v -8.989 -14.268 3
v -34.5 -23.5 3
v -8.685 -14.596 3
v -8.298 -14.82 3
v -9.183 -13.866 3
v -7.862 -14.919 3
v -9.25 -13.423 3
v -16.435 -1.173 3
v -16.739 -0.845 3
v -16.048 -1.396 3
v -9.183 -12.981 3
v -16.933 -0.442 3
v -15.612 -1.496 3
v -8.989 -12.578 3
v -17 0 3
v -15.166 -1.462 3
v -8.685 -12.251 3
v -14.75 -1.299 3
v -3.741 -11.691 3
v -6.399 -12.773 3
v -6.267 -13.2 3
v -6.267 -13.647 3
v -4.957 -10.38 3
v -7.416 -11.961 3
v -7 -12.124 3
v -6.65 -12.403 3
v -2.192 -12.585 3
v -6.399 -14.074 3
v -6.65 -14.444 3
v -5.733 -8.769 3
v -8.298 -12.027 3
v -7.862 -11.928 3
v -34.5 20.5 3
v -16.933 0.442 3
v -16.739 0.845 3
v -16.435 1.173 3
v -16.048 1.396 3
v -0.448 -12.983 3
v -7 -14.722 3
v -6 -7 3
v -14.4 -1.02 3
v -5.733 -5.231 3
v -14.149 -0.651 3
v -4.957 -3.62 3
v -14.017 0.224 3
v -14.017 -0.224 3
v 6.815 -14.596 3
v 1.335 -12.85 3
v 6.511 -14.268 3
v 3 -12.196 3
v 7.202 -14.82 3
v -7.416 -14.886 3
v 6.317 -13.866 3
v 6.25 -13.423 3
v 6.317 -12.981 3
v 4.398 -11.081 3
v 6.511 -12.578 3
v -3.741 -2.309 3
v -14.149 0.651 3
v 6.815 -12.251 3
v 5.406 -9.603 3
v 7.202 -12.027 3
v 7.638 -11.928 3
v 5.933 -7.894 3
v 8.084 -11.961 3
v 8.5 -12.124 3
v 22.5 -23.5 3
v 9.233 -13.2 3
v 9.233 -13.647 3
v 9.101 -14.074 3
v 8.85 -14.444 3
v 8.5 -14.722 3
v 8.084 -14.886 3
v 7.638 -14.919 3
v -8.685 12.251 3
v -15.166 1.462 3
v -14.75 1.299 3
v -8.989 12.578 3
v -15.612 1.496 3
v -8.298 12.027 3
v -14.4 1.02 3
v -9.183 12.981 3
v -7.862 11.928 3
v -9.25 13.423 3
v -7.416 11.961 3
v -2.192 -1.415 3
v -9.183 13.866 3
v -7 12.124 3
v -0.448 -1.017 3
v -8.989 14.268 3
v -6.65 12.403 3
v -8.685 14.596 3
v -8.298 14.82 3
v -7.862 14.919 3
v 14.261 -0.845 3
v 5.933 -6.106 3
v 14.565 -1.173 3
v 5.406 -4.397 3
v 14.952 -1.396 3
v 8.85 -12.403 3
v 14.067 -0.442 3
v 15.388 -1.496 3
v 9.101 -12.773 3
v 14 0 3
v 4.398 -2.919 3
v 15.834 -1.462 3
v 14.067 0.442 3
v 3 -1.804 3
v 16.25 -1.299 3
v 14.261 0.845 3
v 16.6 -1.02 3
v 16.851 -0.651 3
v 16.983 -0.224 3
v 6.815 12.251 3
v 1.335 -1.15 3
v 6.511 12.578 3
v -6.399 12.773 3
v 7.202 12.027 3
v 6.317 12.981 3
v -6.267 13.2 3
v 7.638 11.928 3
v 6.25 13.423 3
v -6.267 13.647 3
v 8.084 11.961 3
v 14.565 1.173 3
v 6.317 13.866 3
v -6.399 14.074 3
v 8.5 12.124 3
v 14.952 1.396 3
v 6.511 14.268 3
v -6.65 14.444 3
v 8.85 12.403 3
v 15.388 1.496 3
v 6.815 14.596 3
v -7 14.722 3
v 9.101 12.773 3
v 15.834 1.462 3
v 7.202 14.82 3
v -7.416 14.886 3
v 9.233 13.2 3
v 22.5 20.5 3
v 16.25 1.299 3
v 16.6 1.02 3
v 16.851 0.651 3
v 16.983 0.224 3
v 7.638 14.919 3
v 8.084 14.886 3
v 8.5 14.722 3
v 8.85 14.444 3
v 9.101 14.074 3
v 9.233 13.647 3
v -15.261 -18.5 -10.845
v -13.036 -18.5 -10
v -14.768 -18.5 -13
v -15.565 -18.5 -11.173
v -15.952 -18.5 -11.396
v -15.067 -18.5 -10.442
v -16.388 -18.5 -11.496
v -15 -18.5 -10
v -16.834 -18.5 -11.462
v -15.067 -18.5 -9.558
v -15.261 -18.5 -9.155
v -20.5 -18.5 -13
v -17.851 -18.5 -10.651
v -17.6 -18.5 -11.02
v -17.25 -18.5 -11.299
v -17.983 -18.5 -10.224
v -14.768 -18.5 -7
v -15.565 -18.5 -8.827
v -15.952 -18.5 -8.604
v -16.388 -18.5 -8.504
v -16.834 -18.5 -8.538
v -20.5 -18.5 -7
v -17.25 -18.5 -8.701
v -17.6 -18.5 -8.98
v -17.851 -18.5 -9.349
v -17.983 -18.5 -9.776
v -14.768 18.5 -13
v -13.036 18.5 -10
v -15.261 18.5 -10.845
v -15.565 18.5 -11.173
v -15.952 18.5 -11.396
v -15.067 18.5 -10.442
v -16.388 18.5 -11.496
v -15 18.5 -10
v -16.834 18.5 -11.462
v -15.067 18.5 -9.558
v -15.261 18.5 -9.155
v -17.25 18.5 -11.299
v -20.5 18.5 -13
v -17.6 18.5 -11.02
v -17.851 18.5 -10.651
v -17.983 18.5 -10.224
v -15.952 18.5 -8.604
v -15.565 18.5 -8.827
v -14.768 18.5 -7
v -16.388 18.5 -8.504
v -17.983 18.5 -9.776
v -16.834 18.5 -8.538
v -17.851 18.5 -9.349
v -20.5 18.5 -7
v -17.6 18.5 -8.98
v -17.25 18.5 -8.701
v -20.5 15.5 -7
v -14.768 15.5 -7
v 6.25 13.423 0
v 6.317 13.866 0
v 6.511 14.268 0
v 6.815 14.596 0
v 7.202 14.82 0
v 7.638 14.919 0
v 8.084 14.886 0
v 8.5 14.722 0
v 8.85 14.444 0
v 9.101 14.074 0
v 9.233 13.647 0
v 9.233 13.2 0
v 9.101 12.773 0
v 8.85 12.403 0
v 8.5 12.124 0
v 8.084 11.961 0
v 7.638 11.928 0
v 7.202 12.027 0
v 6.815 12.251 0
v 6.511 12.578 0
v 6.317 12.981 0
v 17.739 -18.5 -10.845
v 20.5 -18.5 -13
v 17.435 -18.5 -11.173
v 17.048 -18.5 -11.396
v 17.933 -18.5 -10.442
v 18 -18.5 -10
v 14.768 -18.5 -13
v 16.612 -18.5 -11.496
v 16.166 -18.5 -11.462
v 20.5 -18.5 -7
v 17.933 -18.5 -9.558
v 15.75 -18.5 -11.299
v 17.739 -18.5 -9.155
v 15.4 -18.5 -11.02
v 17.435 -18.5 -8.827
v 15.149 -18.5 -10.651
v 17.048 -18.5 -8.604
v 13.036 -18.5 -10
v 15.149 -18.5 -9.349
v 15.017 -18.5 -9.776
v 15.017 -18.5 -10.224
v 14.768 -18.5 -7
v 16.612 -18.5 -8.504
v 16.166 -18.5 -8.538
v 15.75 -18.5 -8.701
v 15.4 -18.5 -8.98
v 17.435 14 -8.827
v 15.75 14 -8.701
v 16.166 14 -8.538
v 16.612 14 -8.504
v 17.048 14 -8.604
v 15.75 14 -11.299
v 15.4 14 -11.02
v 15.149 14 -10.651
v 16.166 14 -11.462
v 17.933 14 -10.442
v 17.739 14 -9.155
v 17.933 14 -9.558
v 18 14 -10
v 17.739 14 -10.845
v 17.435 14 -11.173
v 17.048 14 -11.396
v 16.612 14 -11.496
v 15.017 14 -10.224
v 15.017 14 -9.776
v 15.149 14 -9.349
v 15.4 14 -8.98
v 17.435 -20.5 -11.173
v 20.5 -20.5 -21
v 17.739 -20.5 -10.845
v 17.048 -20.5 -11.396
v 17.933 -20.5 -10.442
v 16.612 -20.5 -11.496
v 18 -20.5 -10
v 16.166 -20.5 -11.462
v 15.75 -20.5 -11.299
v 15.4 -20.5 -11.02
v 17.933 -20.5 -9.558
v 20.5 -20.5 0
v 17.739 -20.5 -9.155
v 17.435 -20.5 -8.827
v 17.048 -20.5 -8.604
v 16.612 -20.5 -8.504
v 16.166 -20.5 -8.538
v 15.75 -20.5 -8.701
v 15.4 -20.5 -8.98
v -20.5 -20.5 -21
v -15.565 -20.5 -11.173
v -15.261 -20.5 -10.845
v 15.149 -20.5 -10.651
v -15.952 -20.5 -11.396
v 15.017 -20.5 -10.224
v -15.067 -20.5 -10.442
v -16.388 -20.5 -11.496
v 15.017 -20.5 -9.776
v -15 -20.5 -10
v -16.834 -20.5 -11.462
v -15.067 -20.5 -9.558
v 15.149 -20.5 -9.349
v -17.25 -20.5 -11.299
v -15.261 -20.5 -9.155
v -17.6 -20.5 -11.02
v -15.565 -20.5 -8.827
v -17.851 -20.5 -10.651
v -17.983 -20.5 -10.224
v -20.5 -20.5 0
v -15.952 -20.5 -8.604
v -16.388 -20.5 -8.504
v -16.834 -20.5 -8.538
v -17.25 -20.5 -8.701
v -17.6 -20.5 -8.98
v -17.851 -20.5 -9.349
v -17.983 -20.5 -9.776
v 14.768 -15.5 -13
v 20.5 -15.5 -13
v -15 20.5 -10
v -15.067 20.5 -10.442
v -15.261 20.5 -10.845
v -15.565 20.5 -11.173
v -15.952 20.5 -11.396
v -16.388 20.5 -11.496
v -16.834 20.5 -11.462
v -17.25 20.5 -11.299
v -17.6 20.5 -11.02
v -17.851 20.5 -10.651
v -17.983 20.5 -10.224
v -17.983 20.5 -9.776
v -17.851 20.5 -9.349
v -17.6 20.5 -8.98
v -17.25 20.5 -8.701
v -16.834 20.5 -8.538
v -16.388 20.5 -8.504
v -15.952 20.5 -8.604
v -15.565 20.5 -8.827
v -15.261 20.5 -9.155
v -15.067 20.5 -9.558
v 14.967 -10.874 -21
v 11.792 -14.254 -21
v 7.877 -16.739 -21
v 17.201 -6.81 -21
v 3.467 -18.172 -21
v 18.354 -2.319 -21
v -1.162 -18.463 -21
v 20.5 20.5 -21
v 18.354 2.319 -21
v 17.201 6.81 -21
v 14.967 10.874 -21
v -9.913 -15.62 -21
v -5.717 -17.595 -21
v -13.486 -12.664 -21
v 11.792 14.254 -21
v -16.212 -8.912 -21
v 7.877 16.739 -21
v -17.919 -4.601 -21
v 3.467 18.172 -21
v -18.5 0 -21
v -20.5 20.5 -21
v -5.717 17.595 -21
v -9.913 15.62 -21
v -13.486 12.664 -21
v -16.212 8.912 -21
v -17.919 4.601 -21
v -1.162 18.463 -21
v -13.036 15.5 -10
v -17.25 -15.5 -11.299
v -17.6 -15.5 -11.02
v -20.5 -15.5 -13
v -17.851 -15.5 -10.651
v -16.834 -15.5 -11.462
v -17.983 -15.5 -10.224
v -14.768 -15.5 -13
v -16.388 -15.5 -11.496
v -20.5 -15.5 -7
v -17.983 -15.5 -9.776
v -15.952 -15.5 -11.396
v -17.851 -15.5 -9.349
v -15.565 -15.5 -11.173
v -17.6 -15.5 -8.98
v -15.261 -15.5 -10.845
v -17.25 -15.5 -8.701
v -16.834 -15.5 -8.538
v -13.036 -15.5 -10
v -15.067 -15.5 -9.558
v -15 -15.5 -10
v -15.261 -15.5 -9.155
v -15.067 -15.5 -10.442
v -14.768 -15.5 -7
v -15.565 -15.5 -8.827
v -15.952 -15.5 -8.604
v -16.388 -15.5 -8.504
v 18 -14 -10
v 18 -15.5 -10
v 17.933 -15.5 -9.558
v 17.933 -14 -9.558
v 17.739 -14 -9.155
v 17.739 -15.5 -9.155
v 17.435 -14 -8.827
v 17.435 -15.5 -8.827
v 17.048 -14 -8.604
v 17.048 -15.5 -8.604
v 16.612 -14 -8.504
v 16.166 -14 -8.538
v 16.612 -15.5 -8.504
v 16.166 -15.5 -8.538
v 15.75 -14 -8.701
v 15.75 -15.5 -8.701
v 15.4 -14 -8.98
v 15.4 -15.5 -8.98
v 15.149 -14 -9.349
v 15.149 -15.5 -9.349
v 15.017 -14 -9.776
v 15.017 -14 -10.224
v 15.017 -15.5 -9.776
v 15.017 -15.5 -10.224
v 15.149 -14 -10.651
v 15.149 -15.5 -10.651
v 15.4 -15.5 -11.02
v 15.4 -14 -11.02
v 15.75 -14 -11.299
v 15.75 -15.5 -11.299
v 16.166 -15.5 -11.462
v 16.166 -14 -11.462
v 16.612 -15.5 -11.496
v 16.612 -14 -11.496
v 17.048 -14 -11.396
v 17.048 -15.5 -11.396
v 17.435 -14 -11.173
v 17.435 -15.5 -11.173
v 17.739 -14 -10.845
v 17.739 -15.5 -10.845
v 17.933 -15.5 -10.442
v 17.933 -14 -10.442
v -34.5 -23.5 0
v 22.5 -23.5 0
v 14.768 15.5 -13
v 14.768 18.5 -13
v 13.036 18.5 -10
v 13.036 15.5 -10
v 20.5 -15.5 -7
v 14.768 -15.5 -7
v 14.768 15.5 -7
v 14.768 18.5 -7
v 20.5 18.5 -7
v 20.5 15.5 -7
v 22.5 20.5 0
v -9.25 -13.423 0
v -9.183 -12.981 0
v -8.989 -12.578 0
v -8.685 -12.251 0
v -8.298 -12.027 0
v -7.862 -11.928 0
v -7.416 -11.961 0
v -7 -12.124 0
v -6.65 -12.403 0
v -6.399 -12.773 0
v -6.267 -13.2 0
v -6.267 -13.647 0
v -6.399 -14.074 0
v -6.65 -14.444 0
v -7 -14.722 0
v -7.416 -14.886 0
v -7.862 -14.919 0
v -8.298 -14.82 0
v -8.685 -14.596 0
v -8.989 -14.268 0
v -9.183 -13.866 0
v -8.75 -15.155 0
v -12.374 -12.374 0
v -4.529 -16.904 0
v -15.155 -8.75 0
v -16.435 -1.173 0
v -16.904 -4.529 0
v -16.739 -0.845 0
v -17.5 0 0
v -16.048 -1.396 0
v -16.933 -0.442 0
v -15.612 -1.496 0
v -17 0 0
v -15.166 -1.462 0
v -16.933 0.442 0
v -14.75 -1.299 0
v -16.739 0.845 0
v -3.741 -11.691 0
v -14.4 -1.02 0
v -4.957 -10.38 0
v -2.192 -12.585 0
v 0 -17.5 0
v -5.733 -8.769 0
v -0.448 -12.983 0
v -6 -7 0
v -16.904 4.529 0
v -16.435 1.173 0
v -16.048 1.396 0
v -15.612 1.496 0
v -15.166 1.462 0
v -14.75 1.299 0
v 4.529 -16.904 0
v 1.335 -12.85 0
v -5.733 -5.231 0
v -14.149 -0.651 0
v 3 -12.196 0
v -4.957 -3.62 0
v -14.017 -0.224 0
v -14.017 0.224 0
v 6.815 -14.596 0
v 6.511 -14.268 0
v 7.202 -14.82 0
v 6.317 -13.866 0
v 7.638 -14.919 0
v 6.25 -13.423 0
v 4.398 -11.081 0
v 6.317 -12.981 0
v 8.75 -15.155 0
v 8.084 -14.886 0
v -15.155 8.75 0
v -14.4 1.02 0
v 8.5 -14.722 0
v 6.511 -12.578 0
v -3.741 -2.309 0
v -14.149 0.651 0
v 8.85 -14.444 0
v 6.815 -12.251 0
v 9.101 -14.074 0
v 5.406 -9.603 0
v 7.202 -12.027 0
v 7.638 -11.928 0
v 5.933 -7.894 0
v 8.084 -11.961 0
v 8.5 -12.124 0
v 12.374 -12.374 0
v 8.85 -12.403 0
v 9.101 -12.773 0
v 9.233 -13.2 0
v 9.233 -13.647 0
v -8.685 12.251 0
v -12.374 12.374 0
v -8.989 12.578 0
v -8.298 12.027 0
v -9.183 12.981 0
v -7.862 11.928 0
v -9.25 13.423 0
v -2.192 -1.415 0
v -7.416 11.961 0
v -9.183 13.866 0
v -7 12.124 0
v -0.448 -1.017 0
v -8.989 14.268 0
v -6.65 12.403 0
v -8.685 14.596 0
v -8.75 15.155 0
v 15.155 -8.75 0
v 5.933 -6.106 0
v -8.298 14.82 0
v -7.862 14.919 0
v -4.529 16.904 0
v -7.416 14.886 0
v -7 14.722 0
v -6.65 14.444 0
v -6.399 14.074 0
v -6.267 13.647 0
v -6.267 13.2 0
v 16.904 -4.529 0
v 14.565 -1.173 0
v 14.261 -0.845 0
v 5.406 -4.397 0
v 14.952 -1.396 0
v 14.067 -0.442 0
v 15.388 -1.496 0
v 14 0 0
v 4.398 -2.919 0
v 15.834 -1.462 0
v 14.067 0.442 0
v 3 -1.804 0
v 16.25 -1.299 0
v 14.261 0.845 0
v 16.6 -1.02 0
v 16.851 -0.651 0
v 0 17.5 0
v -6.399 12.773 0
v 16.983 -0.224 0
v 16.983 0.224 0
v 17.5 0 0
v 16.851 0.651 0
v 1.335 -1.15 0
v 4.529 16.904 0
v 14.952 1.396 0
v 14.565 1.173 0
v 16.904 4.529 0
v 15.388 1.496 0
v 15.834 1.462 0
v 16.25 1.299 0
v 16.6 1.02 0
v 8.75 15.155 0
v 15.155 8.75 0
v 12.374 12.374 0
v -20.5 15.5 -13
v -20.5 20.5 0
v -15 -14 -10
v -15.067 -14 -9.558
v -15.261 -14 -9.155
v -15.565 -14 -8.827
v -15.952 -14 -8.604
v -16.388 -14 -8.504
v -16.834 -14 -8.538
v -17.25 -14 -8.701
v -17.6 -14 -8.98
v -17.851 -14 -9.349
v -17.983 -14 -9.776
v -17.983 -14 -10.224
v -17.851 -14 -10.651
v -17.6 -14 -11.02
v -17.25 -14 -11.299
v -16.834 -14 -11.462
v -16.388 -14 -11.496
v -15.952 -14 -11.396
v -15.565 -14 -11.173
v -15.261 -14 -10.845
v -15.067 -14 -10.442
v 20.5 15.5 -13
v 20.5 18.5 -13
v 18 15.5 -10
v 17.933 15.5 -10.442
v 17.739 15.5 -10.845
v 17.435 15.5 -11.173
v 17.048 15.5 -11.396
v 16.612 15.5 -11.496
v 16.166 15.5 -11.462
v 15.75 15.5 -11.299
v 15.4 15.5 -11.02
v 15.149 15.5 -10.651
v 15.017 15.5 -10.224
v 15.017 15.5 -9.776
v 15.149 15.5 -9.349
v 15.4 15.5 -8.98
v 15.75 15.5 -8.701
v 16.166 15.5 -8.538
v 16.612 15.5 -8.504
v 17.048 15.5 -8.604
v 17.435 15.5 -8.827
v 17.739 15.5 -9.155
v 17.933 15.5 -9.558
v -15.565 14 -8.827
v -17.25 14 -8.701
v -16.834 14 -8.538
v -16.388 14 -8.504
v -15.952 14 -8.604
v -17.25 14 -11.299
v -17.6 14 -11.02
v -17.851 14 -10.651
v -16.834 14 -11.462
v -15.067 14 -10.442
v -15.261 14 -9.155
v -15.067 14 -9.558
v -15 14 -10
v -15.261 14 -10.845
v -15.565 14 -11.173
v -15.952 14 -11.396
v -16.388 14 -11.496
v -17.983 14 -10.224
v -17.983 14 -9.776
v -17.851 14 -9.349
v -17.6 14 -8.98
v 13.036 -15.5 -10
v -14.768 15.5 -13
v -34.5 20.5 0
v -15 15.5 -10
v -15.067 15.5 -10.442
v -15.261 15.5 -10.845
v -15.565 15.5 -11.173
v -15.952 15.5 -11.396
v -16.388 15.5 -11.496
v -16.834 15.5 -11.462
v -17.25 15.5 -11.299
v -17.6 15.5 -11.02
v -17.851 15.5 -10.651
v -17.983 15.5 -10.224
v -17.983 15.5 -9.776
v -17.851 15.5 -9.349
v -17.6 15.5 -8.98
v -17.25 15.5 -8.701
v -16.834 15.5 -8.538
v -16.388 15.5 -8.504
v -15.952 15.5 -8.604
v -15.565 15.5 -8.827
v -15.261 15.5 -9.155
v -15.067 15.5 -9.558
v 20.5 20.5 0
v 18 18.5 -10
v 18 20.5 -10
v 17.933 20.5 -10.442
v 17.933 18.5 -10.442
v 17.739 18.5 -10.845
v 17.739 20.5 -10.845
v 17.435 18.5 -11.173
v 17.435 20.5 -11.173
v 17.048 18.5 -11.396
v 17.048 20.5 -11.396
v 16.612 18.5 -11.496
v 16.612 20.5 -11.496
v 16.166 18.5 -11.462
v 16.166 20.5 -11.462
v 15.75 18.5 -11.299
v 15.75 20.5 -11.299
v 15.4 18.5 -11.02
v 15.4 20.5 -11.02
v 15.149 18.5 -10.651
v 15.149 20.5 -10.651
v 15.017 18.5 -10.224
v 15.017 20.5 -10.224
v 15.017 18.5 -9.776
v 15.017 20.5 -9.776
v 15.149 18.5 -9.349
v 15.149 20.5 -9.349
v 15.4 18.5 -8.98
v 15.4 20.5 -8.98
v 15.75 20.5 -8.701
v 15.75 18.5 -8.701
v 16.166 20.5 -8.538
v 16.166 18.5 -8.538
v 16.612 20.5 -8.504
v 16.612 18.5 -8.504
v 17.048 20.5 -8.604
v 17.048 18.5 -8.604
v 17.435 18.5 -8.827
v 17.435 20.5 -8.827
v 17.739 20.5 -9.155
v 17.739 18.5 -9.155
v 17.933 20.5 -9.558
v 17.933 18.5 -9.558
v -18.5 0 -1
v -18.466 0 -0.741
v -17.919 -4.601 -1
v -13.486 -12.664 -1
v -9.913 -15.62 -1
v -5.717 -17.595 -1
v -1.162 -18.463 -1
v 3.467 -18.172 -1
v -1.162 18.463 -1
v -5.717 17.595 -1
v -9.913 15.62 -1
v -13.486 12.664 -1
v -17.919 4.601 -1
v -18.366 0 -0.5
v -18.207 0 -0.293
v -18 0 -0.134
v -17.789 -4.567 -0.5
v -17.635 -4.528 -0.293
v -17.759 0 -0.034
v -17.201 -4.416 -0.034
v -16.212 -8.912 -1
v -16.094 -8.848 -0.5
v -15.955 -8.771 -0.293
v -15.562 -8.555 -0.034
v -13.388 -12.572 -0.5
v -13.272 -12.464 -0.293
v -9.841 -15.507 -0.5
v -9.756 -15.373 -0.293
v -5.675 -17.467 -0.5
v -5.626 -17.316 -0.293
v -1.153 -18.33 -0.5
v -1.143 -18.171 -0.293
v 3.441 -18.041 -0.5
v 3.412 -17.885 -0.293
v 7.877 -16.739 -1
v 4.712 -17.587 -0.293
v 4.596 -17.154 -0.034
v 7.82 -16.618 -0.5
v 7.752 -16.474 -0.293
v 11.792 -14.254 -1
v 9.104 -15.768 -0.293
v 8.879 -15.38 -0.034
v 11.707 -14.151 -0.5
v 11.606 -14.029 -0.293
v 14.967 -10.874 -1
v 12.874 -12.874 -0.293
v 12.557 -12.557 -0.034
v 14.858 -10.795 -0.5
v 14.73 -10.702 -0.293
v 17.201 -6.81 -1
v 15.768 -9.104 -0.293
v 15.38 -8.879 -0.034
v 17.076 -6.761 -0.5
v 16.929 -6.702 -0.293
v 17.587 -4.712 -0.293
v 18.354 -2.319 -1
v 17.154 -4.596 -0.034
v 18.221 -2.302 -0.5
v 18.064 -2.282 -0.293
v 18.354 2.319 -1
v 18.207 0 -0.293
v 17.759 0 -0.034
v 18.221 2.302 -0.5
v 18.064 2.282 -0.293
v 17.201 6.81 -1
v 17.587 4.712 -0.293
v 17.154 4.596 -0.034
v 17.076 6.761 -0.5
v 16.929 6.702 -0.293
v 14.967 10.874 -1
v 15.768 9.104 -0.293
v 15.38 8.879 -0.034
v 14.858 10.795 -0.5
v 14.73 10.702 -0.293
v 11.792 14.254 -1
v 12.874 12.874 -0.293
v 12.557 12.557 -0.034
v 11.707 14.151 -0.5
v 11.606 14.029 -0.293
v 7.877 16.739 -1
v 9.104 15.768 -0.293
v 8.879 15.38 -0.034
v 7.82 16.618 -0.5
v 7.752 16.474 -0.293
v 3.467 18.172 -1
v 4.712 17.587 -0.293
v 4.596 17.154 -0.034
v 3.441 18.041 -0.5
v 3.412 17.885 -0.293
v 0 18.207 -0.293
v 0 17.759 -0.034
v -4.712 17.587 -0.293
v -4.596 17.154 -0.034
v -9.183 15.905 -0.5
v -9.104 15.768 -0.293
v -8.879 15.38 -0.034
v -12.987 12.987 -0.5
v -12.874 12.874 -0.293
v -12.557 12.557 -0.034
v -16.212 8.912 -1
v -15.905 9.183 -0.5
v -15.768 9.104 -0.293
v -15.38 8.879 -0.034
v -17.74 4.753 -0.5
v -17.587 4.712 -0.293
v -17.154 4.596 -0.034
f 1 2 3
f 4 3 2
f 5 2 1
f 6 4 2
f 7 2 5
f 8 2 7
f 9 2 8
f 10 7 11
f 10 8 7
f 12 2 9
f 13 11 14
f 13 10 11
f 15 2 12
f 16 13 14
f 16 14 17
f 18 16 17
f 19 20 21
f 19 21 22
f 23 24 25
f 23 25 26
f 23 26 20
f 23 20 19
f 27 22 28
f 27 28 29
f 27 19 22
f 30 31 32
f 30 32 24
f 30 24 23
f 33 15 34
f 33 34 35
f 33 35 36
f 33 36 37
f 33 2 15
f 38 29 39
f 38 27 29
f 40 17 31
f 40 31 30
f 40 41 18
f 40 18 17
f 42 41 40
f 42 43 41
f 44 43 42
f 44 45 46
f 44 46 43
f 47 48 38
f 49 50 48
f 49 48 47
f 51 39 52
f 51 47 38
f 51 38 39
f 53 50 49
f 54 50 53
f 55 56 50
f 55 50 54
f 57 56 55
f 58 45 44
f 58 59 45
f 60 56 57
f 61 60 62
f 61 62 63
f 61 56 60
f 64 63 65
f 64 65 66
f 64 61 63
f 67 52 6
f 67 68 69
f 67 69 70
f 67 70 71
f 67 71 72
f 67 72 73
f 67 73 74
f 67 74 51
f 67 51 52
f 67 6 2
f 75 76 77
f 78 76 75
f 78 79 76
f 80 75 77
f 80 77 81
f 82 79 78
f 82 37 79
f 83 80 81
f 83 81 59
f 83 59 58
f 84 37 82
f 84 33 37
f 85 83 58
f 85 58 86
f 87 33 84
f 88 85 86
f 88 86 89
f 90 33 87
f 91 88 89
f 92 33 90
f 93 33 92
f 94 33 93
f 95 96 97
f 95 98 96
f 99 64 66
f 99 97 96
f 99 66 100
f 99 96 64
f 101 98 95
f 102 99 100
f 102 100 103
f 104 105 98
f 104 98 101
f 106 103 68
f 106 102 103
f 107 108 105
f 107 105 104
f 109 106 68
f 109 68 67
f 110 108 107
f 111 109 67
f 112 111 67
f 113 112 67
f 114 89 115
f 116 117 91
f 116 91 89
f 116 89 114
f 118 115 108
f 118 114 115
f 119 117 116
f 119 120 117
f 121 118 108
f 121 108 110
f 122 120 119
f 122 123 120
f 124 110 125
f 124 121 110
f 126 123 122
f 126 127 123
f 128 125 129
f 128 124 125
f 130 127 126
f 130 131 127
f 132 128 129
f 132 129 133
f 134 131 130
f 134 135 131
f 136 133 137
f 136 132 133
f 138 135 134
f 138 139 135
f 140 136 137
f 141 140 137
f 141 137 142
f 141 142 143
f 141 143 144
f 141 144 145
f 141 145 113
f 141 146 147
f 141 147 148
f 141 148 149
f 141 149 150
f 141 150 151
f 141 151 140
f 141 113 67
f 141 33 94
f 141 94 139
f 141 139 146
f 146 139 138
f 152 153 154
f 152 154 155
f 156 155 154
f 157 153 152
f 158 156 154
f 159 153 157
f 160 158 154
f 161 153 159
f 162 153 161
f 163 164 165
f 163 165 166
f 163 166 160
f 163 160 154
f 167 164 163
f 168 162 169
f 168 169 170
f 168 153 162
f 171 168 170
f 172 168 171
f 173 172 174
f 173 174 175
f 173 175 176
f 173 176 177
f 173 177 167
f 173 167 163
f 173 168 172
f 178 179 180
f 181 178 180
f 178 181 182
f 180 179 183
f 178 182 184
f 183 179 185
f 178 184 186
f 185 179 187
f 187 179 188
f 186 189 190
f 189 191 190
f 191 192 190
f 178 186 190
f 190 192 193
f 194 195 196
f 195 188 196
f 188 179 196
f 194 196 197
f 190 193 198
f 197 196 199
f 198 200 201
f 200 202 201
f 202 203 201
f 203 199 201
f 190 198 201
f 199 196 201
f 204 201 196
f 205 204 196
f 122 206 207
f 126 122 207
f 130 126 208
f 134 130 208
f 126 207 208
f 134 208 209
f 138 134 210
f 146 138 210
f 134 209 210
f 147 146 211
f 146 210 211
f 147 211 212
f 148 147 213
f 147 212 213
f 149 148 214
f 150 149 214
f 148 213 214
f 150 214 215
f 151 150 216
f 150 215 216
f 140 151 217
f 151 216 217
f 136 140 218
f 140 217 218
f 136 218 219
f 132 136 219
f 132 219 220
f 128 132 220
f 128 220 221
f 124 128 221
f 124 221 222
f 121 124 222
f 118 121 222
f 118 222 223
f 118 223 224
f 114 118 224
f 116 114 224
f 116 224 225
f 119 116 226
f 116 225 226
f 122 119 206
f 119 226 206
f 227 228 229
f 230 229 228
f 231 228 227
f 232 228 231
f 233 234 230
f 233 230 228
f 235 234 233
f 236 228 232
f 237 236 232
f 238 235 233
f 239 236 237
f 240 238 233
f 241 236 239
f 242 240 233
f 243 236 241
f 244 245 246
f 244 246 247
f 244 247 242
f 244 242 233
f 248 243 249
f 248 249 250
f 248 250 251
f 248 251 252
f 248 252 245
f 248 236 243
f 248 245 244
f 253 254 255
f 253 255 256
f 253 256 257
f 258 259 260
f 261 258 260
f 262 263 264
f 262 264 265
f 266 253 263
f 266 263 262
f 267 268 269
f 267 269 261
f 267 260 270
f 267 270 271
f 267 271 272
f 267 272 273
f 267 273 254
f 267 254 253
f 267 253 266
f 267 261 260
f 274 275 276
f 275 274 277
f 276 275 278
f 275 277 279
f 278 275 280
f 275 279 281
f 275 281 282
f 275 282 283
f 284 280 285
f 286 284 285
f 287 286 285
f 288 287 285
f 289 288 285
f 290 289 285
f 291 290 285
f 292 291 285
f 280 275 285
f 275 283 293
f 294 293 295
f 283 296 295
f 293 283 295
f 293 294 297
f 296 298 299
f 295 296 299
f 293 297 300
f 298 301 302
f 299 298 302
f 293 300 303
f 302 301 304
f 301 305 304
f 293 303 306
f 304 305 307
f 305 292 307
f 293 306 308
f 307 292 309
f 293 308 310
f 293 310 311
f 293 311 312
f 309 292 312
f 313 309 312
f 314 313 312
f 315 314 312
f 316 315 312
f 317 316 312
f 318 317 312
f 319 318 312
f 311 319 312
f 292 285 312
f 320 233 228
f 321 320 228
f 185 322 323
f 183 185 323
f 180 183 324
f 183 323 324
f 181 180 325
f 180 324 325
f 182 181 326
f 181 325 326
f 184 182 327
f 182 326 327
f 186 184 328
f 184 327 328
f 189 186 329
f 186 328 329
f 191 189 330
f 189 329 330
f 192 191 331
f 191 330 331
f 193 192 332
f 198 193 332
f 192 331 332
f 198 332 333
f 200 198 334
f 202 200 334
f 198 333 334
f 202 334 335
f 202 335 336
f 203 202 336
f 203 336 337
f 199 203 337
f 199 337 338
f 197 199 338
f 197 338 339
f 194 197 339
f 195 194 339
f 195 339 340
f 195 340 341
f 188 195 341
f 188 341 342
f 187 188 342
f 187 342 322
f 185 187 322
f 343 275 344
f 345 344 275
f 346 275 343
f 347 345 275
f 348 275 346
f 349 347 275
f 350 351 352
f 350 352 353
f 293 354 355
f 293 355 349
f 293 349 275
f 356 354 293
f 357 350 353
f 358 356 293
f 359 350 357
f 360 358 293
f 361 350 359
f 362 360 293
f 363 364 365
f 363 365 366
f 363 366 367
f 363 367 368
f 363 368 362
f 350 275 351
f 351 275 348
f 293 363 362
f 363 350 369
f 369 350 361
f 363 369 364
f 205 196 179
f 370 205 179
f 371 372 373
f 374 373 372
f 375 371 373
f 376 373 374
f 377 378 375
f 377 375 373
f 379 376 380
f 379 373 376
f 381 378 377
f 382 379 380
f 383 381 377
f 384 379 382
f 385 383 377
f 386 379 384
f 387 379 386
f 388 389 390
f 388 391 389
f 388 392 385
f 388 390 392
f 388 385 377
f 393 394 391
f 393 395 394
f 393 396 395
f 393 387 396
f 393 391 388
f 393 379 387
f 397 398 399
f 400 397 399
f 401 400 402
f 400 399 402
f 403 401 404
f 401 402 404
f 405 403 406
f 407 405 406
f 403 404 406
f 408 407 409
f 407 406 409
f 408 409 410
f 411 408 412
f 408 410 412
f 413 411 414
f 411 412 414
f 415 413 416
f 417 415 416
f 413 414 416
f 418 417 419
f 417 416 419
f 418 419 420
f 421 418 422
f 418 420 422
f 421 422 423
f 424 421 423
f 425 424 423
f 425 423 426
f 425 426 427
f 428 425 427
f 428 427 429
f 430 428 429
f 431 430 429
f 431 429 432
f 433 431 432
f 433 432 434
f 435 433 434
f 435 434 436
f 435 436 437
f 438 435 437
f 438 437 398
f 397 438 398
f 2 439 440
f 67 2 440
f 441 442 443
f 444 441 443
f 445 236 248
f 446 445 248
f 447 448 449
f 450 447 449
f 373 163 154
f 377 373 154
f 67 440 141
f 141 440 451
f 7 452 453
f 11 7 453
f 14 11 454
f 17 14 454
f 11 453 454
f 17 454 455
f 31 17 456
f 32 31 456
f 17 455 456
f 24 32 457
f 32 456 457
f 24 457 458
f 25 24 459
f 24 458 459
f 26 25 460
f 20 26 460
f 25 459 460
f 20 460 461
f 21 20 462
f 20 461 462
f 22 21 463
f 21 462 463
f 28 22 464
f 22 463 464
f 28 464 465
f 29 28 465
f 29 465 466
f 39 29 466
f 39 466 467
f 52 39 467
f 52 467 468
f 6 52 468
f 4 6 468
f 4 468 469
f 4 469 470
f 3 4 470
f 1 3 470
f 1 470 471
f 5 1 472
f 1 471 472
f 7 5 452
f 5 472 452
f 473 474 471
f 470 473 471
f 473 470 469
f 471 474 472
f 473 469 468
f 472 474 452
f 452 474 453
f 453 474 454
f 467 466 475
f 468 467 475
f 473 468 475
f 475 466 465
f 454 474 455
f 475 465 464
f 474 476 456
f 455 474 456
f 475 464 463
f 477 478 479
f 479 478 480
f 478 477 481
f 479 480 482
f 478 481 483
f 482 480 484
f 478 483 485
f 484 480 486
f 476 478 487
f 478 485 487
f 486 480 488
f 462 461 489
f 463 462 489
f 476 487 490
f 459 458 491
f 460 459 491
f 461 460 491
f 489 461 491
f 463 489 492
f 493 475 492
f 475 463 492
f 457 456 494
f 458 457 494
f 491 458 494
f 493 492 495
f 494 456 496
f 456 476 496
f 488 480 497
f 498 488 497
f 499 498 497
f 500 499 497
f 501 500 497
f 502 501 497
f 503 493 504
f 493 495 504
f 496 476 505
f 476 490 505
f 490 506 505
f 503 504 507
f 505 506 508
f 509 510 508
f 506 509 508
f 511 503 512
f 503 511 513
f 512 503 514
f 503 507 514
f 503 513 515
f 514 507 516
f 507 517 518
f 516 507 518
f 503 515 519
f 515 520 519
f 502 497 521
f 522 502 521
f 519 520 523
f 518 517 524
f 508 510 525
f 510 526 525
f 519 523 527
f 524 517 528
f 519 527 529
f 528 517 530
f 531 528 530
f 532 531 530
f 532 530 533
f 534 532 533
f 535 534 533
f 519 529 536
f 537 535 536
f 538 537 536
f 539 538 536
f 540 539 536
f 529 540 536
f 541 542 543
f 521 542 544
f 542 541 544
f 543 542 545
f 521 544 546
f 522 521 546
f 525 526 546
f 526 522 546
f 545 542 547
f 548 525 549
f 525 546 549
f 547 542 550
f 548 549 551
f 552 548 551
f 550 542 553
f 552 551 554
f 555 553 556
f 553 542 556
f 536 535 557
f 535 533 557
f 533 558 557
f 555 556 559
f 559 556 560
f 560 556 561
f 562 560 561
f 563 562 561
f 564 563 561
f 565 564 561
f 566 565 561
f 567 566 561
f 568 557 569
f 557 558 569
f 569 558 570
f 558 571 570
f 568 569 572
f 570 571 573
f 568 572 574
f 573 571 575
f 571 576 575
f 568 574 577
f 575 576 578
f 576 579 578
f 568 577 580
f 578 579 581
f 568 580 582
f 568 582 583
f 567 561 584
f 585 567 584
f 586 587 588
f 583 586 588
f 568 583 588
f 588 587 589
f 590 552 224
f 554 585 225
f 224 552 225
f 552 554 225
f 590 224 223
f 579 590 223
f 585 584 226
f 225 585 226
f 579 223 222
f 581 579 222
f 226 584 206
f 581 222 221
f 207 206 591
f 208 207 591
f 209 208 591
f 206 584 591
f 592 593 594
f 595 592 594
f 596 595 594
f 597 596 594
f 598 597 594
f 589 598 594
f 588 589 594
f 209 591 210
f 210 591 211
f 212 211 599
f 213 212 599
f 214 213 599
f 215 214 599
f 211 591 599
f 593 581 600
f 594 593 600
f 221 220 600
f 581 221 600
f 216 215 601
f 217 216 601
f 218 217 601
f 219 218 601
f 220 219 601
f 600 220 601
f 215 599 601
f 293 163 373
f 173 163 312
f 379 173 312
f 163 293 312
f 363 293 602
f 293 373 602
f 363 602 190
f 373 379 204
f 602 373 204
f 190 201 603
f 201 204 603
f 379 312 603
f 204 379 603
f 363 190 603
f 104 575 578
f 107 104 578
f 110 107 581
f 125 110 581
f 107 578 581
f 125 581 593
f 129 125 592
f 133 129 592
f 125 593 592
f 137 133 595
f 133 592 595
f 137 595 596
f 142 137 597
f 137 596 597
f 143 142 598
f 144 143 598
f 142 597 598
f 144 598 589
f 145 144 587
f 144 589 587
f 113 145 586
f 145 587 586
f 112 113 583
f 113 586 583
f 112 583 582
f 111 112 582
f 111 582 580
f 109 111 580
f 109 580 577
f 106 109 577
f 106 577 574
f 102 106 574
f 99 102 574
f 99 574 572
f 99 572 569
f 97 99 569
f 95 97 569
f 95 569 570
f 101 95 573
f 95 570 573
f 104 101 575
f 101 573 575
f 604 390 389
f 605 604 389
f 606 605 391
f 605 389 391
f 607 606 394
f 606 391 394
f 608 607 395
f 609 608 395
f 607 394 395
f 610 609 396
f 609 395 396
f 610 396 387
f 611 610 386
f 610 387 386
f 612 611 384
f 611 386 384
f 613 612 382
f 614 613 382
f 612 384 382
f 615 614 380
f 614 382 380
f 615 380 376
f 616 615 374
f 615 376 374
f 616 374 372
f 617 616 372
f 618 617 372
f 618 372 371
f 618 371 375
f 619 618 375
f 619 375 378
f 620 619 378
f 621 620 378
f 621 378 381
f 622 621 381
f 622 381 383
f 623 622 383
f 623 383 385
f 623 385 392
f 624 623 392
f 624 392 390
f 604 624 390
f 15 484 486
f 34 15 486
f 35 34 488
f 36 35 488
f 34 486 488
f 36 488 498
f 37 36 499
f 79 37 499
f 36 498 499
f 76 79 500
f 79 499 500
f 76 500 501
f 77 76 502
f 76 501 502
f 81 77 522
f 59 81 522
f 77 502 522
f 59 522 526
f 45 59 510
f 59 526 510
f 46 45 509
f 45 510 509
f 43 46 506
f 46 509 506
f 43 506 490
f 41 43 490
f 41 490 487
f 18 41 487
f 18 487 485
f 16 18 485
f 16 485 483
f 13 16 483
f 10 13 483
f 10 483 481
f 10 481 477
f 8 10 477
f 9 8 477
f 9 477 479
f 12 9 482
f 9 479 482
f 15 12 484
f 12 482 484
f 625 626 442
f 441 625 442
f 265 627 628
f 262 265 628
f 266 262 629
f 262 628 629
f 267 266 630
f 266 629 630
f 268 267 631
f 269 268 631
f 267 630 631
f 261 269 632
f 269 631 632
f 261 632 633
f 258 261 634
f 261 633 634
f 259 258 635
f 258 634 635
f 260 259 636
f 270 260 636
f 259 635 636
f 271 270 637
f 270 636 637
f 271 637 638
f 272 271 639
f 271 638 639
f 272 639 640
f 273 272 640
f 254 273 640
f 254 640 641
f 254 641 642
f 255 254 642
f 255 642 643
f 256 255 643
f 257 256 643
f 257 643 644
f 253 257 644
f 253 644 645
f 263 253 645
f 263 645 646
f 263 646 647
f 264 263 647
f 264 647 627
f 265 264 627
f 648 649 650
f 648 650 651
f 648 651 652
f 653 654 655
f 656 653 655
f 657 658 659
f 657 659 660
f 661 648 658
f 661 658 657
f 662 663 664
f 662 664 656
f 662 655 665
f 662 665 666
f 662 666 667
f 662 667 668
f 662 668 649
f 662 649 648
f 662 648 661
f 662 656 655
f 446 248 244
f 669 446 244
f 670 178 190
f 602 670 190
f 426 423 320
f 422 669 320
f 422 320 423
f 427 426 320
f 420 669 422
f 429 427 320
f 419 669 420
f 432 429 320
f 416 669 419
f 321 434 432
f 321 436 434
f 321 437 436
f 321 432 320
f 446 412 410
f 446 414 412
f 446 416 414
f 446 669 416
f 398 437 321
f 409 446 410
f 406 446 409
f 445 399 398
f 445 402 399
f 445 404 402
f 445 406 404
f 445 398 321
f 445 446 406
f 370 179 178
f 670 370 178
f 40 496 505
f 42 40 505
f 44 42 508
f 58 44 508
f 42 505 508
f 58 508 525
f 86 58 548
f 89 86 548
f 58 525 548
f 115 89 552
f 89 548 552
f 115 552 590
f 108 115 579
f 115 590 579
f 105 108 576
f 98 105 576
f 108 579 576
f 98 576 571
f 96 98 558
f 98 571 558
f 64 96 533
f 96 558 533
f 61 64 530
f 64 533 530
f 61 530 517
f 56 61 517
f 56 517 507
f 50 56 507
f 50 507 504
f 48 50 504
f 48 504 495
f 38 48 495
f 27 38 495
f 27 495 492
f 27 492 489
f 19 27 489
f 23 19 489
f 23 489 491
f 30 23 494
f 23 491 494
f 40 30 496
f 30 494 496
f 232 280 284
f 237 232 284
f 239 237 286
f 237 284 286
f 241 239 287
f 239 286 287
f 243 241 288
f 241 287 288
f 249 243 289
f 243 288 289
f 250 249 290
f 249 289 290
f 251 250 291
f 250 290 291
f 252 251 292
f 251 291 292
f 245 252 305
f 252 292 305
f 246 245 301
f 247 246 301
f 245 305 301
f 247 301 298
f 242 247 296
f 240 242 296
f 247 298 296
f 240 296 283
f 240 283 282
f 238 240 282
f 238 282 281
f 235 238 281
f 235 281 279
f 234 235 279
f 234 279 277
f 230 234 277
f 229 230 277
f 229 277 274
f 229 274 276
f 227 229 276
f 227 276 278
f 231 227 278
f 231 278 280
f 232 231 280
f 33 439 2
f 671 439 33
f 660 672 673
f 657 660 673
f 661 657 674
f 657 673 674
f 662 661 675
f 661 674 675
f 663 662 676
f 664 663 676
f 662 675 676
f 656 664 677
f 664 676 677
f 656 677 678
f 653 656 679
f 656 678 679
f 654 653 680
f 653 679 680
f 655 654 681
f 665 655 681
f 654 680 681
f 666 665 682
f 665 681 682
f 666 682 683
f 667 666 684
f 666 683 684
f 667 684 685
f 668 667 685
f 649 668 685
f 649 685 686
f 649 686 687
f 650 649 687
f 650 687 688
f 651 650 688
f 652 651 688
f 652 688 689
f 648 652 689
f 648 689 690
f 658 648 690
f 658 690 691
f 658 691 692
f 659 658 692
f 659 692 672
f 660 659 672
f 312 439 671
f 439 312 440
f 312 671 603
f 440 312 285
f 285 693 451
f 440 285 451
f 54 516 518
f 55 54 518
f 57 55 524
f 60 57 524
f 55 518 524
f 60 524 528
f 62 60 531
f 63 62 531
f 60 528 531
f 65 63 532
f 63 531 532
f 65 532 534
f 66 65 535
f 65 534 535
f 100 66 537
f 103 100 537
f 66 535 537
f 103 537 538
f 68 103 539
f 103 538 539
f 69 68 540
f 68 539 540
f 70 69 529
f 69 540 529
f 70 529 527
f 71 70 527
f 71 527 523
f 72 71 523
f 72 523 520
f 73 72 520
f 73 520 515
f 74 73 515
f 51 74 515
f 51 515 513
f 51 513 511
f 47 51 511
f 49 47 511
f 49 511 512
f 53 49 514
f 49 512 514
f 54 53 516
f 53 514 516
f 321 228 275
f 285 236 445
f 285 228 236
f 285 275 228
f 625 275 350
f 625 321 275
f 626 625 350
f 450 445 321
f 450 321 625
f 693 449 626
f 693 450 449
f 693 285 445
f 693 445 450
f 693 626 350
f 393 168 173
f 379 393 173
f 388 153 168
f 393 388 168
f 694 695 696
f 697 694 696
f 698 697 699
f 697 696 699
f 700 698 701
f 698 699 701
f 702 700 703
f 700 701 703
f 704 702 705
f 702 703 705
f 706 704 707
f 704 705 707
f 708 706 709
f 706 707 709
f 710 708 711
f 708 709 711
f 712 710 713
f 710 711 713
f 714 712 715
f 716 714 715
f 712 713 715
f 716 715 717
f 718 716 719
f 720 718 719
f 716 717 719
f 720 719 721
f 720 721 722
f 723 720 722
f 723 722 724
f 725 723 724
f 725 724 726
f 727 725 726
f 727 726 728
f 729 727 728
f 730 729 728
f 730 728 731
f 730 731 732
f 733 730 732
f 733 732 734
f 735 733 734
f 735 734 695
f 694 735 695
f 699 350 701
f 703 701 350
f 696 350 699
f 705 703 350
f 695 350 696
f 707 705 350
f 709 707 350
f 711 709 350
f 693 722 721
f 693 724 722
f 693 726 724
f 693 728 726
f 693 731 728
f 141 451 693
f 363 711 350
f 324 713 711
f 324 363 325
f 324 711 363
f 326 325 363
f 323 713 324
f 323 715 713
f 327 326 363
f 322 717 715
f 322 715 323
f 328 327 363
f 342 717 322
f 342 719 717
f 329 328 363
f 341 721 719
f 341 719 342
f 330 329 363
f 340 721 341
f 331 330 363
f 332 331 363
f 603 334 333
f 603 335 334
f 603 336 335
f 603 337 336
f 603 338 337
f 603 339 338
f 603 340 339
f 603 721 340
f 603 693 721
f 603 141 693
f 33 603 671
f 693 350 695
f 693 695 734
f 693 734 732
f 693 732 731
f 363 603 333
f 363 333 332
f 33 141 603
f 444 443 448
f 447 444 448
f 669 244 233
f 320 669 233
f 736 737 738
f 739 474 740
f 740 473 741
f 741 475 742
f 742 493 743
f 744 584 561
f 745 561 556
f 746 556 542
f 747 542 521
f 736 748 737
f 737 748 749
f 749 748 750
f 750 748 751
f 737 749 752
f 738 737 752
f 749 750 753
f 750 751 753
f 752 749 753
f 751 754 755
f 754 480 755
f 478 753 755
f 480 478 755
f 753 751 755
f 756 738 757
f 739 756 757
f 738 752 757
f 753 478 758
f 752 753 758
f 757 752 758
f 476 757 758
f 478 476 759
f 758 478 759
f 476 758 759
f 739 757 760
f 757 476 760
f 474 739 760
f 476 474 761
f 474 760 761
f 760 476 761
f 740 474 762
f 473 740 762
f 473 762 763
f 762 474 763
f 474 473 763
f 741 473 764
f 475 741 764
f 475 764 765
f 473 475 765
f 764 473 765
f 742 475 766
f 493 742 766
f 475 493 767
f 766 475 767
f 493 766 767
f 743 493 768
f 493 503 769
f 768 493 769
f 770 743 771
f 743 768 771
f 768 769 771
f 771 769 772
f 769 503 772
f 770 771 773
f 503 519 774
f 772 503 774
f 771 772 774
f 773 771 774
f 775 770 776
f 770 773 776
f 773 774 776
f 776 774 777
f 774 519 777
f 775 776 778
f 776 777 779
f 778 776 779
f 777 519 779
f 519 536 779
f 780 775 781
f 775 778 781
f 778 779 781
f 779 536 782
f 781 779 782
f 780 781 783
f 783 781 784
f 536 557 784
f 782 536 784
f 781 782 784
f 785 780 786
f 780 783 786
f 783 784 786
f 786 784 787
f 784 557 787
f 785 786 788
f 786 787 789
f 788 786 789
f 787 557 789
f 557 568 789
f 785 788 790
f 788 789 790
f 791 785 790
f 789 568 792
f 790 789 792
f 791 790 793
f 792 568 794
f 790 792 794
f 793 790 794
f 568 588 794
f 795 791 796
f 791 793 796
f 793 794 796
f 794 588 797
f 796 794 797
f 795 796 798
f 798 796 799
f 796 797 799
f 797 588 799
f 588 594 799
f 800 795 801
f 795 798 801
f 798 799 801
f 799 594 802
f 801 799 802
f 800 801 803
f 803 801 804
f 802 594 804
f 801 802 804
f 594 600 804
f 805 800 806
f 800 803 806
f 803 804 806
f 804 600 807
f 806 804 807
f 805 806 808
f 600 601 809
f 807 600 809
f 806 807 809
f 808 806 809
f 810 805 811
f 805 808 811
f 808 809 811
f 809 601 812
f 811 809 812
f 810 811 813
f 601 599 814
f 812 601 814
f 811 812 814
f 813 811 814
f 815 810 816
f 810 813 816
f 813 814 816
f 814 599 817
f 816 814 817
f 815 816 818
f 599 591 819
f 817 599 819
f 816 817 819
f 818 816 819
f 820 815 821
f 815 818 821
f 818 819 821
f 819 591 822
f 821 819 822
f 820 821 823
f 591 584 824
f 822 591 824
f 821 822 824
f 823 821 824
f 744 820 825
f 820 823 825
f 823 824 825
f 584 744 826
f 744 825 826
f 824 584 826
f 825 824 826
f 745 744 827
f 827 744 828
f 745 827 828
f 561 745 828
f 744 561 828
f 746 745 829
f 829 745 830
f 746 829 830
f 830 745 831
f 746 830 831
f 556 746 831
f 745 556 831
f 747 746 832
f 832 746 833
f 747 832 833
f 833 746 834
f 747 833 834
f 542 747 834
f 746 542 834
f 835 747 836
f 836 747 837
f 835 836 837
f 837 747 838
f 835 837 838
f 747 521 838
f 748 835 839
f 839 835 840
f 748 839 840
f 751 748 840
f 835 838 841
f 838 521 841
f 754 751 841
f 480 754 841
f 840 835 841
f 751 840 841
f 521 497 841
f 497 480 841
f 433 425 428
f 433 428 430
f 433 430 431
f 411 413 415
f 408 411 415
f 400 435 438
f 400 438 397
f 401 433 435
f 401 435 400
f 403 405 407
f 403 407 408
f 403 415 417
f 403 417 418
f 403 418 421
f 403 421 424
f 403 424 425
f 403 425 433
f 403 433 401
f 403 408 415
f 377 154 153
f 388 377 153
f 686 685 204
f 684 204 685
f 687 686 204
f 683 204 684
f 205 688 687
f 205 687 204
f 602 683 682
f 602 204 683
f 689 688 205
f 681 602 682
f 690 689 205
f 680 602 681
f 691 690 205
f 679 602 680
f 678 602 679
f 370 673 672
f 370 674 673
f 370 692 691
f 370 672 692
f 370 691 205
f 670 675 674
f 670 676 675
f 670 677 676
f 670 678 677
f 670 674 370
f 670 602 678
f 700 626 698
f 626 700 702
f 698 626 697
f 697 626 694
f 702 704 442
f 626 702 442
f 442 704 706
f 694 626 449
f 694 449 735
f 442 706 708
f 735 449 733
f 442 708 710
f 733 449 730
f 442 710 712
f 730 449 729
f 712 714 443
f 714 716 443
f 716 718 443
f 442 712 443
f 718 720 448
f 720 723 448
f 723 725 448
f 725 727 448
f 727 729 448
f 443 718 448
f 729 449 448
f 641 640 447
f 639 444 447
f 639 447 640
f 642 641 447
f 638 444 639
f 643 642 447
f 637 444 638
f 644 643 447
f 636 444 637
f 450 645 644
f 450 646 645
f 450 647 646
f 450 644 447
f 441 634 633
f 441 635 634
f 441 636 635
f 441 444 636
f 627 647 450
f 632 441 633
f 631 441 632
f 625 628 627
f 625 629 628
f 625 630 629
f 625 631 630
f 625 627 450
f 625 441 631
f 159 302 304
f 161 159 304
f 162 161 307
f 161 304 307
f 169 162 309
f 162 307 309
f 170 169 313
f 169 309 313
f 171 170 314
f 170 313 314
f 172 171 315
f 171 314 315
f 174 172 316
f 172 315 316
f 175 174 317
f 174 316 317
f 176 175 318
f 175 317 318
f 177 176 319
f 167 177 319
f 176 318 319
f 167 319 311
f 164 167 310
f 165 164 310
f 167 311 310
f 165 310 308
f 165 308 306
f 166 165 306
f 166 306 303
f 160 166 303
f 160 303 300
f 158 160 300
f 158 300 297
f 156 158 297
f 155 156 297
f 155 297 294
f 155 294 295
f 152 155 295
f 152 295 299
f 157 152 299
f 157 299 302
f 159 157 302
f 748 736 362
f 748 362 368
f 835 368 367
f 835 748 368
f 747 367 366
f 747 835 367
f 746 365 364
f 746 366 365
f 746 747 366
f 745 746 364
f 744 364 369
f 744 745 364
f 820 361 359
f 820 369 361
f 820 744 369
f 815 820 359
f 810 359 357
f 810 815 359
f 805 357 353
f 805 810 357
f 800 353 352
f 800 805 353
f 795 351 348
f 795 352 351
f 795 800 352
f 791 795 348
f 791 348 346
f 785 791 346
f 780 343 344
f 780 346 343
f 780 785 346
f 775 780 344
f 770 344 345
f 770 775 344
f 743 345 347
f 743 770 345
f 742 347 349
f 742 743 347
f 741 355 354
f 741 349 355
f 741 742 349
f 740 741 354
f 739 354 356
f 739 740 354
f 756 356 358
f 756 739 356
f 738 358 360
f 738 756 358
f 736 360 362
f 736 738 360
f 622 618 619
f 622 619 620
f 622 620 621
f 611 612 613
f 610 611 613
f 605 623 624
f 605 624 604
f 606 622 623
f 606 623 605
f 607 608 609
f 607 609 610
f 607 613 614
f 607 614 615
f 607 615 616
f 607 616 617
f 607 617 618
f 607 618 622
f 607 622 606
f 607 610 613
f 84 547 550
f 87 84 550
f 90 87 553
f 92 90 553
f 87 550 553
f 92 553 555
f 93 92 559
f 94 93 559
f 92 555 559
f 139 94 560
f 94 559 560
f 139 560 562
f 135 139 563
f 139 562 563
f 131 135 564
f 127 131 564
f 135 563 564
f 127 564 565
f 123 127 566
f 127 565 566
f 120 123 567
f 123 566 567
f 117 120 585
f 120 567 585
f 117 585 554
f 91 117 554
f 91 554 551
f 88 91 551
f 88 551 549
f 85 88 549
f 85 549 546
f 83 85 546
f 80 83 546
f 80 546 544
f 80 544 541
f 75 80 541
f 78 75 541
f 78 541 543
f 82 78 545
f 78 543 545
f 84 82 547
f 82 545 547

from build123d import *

# Parameters (mm, degrees)
SKETCH_1_W             = 69
SKETCH_1_H             = 44
EXTRUDE_624_DEPTH      = 3
SKETCH_2_R             = 1.5
SKETCH_2_R_2           = 6
CUT_EXTRUDE_837_DEPTH  = 3
SKETCH_4_R             = 20.5
SKETCH_4_R_2           = 18.5
EXTRUDE_1079_DEPTH     = 21
EXTRUDE_1525_DEPTH     = 21
SKETCH_20_W            = 1.345299462
SKETCH_20_H            = 6
CUT_EXTRUDE_2290_DEPTH = 3
SKETCH_21_W            = 1.345299462
SKETCH_21_H            = 6
CUT_EXTRUDE_2993_DEPTH = 3
SKETCH_11_W            = 41
SKETCH_11_H            = 2
EXTRUDE_3369_DEPTH     = 21
SKETCH_16_R            = 1.5
CUT_EXTRUDE_3664_DEPTH = 6.5
SKETCH_17_R            = 1.5
CUT_EXTRUDE_4007_DEPTH = 6.5
SKETCH_22_W            = 12
SKETCH_22_H            = 44
CUT_EXTRUDE_4241_DEPTH = 3
FILLET_1_R             = 1


with BuildPart() as part:
    # 草图1 → Extrude 624 (new body)
    with BuildSketch(Plane.XY):
        with Locations((0, -1.5)):
            Rectangle(SKETCH_1_W, SKETCH_1_H)
    extrude(amount=EXTRUDE_624_DEPTH)

    # 草图2 → Cut-Extrude 837 (cut)
    with BuildSketch(Plane(origin=(0, 0, 0), x_dir=(-1, 0, 0), z_dir=(0, 0, -1))):
        with Locations((-15.5, 0)):
            Circle(SKETCH_2_R)
        with Locations((-7.75, 13.423393759)):
            Circle(SKETCH_2_R)
        with Locations((7.75, 13.423393759)):
            Circle(SKETCH_2_R)
        with Locations((15.5, 0)):
            Circle(SKETCH_2_R)
        with Locations((7.75, -13.423393759)):
            Circle(SKETCH_2_R)
        with Locations((-7.75, -13.423393759)):
            Circle(SKETCH_2_R)
        with Locations((0, -7)):
            Circle(SKETCH_2_R_2)
    extrude(amount=-CUT_EXTRUDE_837_DEPTH, mode=Mode.SUBTRACT)

    # 草图4 → Extrude 1079 (add)
    with BuildSketch(Plane(origin=(0, 0, 0), x_dir=(-1, 0, 0), z_dir=(0, 0, -1))):
        Circle(SKETCH_4_R)
        Circle(SKETCH_4_R_2, mode=Mode.SUBTRACT)
    extrude(amount=EXTRUDE_1079_DEPTH)

    # 草图13 → Extrude 1525 (add)
    with BuildSketch(Plane(origin=(0, 0, 0), x_dir=(-1, 0, 0), z_dir=(0, 0, -1))):
        with BuildLine():
            Line((-20.5, 18.5), (-20.5, -3.7e-08))
            ThreePointArc((-20.5, -3.7e-08), (-17.339277644, 10.936153381), (-8.831760866, 18.5))
            Line((-8.831760866, 18.5), (-20.5, 18.5))
        make_face()
        with BuildLine():
            Line((-20.5, -18.5), (-8.831760866, -18.5))
            ThreePointArc((-8.831760866, -18.5), (-17.339277624, -10.936153413), (-20.5, -3.7e-08))
            Line((-20.5, -3.7e-08), (-20.5, -18.5))
        make_face()
        with BuildLine():
            Line((8.831760866, -18.5), (20.5, -18.5))
            Line((20.5, -18.5), (20.5, 0))
            ThreePointArc((20.5, 0), (17.339277634, -10.936153397), (8.831760866, -18.5))
        make_face()
        with BuildLine():
            ThreePointArc((8.831760866, 18.5), (17.339277634, 10.936153397), (20.5, 0))
            Line((20.5, 0), (20.5, 18.5))
            Line((20.5, 18.5), (8.831760866, 18.5))
        make_face()
    extrude(amount=EXTRUDE_1525_DEPTH)

    # 草图20 → Cut-Extrude 2290 (cut)
    with BuildSketch(Plane.XZ.offset(18.5)):
        Polygon((19.154700538, -11.401923789), (19.154700538, -7), (18.232050808, -7), (14.767949192, -7), (13.035898385, -10), (14.767949192, -13), (19.154700538, -13), align=None)
        Polygon((20.5, -7), (19.154700538, -7), (19.154700538, -11.401923789), (20.5, -9.07179677), align=None)
        Polygon((20.5, -9.07179677), (19.154700538, -11.401923789), (19.154700538, -13), (20.5, -13), align=None)
        with Locations((-19.827350269, -10)):
            Rectangle(SKETCH_20_W, SKETCH_20_H)
        Polygon((-14.767949192, -7), (-19.154700538, -7), (-19.154700538, -13), (-14.767949192, -13), (-13.035898385, -10), align=None)
    extrude(amount=-CUT_EXTRUDE_2290_DEPTH, mode=Mode.SUBTRACT)

    # 草图21 → Cut-Extrude 2993 (cut)
    with BuildSketch(Plane(origin=(0, 18.5, 0), x_dir=(1, 0, 0), z_dir=(0, 1, 0))):
        Polygon((19.154700538, 8.598076211), (19.154700538, 13), (18.232050808, 13), (14.767949192, 13), (13.035898385, 10), (14.767949192, 7), (19.154700538, 7), align=None)
        Polygon((20.5, 13), (19.154700538, 13), (19.154700538, 8.598076211), (20.5, 10.92820323), align=None)
        Polygon((20.5, 10.92820323), (19.154700538, 8.598076211), (19.154700538, 7), (20.5, 7), align=None)
        with Locations((-19.827350269, 10)):
            Rectangle(SKETCH_21_W, SKETCH_21_H)
        Polygon((-14.767949192, 13), (-19.154700538, 13), (-19.154700538, 7), (-14.767949192, 7), (-13.035898385, 10), align=None)
    extrude(amount=-CUT_EXTRUDE_2993_DEPTH, mode=Mode.SUBTRACT)

    # 草图11 → Extrude 3369 (add)
    with BuildSketch(Plane(origin=(0, 0, 0), x_dir=(-1, 0, 0), z_dir=(0, 0, -1))):
        with Locations((0, 19.5)):
            Rectangle(SKETCH_11_W, SKETCH_11_H)
        with Locations((0, -19.5)):
            Rectangle(SKETCH_11_W, SKETCH_11_H)
    extrude(amount=EXTRUDE_3369_DEPTH)

    # 草图16 → Cut-Extrude 3664 (cut)
    with BuildSketch(Plane.XZ.offset(20.5)):
        with Locations((-16.5, -10)):
            Circle(SKETCH_16_R)
        with Locations((16.5, -10)):
            Circle(SKETCH_16_R)
    extrude(amount=-CUT_EXTRUDE_3664_DEPTH, mode=Mode.SUBTRACT)

    # 草图17 → Cut-Extrude 4007 (cut)
    with BuildSketch(Plane(origin=(0, 20.5, 0), x_dir=(1, 0, 0), z_dir=(0, 1, 0))):
        with Locations((-16.5, 10)):
            Circle(SKETCH_17_R)
        with Locations((16.5, 10)):
            Circle(SKETCH_17_R)
    extrude(amount=-CUT_EXTRUDE_4007_DEPTH, mode=Mode.SUBTRACT)

    # 草图22 → Cut-Extrude 4241 (cut)
    with BuildSketch(Plane(origin=(0, 0, 0), x_dir=(-1, 0, 0), z_dir=(0, 0, -1))):
        with Locations((-28.5, -1.5)):
            Rectangle(SKETCH_22_W, SKETCH_22_H)
    extrude(amount=-CUT_EXTRUDE_4241_DEPTH, mode=Mode.SUBTRACT)

    # 圆角1
    fillet_1_edges = [part.edges().sort_by_distance(p)[0] for p in [
        (18.5, 0, 0),
    ]]
    fillet(fillet_1_edges, radius=FILLET_1_R)


solid = part.part
